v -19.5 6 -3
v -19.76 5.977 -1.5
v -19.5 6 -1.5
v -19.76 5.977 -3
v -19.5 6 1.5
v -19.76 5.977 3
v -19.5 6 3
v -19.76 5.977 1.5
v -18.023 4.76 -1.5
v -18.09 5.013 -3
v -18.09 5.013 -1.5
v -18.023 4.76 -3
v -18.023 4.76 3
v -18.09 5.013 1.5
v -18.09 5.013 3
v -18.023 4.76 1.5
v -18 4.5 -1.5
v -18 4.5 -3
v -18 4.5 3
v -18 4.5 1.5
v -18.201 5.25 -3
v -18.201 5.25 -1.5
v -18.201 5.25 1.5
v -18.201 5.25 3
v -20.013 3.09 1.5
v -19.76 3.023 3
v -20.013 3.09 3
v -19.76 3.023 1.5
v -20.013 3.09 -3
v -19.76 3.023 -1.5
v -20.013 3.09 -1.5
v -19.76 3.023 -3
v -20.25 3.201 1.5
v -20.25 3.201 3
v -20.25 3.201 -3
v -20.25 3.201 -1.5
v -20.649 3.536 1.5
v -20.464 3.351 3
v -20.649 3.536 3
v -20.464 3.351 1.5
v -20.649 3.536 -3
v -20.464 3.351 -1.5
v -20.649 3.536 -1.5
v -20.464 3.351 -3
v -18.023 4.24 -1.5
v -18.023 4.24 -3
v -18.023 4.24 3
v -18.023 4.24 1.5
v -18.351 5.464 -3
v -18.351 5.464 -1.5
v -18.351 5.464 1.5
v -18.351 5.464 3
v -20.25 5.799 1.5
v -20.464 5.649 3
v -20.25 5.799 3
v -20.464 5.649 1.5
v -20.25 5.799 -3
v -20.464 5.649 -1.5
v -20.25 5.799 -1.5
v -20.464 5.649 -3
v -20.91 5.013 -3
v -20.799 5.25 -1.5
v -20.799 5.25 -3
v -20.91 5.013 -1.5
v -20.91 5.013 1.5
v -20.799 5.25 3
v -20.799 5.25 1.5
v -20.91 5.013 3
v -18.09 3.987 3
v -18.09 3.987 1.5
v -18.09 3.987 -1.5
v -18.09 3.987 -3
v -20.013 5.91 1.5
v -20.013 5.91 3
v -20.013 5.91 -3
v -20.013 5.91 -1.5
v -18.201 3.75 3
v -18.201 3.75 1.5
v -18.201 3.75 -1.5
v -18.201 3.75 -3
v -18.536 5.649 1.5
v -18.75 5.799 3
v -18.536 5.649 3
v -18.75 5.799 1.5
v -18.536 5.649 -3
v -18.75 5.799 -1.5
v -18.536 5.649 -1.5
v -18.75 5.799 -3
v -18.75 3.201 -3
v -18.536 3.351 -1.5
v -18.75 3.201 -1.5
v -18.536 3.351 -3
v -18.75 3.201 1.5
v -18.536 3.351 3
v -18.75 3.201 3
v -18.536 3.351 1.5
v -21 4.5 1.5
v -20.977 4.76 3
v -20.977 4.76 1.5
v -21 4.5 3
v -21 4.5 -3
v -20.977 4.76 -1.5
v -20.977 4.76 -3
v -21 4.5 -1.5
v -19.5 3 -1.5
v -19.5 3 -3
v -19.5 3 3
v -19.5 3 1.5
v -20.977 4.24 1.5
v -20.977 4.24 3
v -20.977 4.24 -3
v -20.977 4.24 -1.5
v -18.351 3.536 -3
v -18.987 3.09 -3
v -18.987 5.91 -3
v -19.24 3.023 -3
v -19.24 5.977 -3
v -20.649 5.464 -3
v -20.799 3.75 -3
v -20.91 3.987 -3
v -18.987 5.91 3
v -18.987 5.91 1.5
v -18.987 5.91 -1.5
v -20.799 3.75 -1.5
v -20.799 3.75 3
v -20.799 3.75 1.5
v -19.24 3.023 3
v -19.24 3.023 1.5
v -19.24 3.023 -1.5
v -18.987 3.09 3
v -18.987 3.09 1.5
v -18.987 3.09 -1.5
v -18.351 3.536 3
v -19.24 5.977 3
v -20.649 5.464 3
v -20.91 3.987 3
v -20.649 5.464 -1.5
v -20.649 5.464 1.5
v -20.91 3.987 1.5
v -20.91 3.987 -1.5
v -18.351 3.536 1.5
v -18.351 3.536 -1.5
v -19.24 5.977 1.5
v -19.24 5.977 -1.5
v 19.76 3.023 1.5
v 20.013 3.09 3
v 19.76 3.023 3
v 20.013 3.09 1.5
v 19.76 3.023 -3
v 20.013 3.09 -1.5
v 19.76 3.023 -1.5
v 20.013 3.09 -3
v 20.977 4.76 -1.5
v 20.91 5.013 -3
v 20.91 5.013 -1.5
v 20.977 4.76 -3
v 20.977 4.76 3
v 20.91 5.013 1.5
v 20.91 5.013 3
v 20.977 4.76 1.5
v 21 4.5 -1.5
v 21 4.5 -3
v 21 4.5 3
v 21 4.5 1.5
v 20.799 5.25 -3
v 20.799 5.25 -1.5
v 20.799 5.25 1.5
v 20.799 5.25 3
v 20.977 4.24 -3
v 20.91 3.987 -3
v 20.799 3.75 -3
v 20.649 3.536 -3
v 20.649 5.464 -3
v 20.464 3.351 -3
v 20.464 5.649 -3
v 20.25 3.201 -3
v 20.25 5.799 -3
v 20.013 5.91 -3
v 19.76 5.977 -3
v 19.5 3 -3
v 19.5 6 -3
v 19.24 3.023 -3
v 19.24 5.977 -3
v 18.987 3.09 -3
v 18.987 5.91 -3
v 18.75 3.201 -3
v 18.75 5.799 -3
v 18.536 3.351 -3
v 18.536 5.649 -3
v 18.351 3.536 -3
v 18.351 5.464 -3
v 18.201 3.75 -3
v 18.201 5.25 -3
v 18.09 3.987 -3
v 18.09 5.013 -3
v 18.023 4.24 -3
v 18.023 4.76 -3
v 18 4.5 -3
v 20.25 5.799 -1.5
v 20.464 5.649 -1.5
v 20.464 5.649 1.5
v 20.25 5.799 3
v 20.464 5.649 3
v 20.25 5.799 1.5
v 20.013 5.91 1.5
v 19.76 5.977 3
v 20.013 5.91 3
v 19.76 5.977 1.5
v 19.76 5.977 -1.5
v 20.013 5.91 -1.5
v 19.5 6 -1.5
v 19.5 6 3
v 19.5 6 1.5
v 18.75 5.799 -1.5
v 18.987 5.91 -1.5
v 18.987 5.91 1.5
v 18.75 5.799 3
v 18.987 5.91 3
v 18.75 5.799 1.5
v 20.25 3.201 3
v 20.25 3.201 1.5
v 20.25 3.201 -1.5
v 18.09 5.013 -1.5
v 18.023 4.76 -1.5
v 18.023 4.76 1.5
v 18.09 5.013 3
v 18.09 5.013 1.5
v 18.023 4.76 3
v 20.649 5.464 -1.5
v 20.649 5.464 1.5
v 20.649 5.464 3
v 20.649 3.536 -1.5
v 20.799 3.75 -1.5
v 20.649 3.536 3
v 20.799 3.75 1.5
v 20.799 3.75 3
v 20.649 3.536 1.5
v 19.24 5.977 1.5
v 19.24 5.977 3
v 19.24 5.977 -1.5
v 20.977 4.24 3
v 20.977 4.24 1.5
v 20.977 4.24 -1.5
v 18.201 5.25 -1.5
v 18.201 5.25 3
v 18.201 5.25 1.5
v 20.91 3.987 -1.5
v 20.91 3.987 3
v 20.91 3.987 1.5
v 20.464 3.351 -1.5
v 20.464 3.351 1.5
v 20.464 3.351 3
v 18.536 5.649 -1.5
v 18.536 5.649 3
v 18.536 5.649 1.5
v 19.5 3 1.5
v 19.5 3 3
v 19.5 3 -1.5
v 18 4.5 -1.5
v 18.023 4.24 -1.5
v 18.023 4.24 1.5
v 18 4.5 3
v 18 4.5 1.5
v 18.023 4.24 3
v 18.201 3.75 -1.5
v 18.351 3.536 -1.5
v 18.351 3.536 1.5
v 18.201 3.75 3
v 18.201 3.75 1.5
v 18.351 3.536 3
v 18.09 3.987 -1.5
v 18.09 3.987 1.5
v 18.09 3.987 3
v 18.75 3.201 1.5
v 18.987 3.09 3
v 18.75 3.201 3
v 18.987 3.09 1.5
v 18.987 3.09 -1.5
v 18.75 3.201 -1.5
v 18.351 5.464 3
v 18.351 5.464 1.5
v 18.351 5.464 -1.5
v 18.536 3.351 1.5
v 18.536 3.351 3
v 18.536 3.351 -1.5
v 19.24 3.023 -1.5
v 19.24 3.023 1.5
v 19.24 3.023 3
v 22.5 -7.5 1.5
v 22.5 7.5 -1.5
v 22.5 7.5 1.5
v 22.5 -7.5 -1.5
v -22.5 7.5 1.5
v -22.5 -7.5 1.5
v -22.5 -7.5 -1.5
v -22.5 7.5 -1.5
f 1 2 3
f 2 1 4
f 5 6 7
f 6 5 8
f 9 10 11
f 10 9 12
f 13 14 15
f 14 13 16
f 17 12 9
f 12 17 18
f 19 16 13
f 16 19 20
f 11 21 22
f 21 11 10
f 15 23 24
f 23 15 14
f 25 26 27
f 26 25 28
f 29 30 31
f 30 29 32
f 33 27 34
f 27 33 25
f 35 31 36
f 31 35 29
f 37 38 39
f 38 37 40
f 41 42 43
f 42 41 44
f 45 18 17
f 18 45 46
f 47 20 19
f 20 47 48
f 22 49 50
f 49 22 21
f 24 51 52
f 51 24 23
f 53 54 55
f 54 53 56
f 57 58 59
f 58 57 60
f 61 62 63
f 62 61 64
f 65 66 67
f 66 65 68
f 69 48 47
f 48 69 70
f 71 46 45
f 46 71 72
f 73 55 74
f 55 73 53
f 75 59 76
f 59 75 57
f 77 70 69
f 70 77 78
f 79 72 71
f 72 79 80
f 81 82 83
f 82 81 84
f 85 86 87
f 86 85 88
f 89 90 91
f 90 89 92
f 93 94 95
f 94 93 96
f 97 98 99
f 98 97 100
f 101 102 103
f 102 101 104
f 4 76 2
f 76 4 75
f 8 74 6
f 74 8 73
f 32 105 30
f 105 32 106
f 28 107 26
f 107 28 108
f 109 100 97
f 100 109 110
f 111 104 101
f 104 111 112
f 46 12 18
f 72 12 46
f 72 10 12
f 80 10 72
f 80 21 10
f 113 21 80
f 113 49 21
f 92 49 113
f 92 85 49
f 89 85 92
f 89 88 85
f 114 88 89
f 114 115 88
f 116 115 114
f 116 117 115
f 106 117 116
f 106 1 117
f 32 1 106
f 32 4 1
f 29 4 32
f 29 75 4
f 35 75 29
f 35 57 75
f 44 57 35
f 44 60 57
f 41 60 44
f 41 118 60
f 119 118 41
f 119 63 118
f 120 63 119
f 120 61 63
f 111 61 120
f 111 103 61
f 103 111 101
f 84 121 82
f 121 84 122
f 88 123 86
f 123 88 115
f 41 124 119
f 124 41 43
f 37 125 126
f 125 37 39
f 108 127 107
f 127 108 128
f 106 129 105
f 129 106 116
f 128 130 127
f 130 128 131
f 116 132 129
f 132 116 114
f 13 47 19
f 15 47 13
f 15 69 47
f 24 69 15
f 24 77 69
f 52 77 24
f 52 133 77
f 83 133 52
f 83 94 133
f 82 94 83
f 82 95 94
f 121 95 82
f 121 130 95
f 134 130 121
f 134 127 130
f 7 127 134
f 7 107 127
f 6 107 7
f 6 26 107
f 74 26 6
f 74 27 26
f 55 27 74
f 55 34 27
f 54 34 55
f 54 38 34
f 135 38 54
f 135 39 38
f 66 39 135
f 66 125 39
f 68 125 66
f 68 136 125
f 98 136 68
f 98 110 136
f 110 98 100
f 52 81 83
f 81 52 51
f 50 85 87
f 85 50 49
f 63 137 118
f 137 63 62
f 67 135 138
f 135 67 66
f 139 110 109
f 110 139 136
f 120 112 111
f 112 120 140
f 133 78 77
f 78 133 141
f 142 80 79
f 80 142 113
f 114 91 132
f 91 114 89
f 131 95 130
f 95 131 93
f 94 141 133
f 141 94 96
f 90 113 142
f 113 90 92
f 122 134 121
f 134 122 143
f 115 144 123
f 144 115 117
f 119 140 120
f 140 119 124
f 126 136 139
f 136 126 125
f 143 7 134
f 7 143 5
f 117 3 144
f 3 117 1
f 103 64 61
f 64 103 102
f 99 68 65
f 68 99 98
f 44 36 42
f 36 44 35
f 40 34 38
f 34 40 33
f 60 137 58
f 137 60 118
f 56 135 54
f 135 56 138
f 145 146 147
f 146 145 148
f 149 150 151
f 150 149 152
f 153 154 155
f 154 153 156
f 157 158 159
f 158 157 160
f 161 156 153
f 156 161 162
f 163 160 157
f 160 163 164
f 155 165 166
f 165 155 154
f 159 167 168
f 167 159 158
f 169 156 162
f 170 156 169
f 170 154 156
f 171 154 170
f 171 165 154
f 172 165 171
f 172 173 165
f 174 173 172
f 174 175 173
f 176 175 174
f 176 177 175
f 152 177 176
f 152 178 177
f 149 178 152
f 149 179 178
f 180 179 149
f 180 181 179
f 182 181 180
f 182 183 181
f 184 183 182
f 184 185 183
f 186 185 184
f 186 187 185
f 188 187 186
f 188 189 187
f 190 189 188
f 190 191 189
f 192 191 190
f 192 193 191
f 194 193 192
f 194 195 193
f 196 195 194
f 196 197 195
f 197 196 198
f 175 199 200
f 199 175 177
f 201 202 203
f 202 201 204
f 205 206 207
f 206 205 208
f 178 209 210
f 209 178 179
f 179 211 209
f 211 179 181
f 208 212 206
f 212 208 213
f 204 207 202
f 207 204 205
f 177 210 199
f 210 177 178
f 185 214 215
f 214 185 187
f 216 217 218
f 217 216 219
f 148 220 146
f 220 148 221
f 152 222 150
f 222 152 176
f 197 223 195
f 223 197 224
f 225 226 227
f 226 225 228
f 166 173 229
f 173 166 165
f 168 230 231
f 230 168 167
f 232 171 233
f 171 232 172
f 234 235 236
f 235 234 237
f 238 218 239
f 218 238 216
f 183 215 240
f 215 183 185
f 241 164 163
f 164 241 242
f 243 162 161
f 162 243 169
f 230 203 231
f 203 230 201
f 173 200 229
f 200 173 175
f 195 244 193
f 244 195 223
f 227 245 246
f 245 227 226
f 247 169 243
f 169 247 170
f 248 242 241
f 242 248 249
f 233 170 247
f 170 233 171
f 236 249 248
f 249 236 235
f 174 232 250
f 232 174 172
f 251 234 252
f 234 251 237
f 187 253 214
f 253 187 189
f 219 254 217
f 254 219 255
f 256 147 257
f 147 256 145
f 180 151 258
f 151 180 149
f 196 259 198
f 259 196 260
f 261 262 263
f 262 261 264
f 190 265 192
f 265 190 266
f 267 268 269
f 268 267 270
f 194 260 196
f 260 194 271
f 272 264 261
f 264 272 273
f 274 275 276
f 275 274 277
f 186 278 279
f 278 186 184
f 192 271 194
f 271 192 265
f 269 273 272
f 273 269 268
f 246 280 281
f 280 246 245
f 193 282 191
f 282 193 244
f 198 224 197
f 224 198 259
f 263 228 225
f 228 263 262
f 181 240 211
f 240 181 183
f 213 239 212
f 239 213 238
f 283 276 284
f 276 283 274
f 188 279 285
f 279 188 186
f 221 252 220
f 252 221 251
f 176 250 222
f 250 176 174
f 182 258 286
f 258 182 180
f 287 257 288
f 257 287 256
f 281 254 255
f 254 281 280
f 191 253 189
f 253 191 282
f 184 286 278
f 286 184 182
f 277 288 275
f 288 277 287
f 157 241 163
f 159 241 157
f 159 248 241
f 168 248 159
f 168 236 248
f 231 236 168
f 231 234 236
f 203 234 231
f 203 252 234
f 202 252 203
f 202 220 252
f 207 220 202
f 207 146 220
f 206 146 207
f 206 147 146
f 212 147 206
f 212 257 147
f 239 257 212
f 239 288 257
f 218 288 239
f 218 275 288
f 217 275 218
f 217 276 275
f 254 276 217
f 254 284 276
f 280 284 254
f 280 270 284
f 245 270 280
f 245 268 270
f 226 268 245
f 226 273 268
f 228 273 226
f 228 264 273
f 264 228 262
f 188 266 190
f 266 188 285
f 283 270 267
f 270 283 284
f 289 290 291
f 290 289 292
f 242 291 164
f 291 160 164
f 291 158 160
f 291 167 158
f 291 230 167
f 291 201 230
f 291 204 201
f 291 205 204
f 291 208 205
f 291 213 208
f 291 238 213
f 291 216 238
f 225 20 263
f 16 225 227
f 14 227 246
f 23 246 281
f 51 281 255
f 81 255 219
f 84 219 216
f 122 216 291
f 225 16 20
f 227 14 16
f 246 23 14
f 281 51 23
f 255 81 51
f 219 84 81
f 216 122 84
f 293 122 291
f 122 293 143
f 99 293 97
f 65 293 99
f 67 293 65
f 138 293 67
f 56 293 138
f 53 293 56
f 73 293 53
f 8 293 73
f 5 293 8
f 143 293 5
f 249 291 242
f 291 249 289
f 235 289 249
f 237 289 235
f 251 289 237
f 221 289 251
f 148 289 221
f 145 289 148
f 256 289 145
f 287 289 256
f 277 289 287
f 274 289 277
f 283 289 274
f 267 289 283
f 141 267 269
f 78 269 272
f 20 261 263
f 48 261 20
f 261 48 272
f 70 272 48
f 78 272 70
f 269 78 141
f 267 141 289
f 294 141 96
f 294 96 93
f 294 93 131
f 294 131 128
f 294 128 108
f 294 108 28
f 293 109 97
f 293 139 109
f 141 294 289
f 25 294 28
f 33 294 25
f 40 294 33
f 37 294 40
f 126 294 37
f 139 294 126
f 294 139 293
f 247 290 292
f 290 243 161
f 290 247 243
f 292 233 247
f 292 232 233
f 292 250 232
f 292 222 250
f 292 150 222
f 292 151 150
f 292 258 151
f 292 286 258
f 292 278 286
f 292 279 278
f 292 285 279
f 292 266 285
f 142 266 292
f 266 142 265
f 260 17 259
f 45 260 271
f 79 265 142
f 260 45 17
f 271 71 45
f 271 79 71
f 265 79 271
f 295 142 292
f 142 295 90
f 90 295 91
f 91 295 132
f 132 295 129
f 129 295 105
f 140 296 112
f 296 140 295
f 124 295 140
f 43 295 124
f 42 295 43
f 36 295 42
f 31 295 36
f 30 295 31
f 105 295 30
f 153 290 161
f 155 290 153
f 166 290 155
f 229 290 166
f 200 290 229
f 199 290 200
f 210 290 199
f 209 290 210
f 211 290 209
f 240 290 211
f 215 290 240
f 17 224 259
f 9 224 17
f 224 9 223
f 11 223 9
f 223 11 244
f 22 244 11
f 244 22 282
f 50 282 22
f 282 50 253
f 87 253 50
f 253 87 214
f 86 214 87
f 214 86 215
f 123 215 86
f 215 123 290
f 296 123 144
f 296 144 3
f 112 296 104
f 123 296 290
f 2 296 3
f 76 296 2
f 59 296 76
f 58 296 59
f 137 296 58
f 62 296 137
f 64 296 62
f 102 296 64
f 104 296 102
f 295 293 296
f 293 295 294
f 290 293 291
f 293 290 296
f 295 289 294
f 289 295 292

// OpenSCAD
/* [Base]  */
//length of name tag
xSize=45; //[30:100]
//width of name tag
ySize=15; //[5:40]
//thickness of name tag
zSize=3; //[3,5,7]
//hole diameter
holeDiameter = 3; // [3,4,5,6]

/* [Text]  */
// height above base
textHeight = 2; // [1,2,3,5]
// text size
textSize = 7.5; // [3:35]
// font for text
myFont = "Liberation Sans";
//test to put on plate
textInput = "";
module base() {
    
    cube([xSize, ySize, zSize], center = true); 
    
    
    
}

module holes() {
    holeRadius = holeDiameter/2;
        translate([-xSize/2+holeDiameter, ySize/2-holeDiameter, 0])
    
   #cylinder(r = holeRadius, h = 2*zSize, $fn = 36, center = true); 
    
     translate([xSize/2-holeDiameter, ySize/2-holeDiameter, 0])
    
   #cylinder(r = holeRadius, h = 2*zSize, $fn = 36, center = true);
}
//difference() {
base();
holes();
//}
module textExtrude(){
    
    linear_extrude(height = textHeight) text(textInput, halign = "center", valign = "center", size = textSize, font = myFont);


}
textExtrude();
